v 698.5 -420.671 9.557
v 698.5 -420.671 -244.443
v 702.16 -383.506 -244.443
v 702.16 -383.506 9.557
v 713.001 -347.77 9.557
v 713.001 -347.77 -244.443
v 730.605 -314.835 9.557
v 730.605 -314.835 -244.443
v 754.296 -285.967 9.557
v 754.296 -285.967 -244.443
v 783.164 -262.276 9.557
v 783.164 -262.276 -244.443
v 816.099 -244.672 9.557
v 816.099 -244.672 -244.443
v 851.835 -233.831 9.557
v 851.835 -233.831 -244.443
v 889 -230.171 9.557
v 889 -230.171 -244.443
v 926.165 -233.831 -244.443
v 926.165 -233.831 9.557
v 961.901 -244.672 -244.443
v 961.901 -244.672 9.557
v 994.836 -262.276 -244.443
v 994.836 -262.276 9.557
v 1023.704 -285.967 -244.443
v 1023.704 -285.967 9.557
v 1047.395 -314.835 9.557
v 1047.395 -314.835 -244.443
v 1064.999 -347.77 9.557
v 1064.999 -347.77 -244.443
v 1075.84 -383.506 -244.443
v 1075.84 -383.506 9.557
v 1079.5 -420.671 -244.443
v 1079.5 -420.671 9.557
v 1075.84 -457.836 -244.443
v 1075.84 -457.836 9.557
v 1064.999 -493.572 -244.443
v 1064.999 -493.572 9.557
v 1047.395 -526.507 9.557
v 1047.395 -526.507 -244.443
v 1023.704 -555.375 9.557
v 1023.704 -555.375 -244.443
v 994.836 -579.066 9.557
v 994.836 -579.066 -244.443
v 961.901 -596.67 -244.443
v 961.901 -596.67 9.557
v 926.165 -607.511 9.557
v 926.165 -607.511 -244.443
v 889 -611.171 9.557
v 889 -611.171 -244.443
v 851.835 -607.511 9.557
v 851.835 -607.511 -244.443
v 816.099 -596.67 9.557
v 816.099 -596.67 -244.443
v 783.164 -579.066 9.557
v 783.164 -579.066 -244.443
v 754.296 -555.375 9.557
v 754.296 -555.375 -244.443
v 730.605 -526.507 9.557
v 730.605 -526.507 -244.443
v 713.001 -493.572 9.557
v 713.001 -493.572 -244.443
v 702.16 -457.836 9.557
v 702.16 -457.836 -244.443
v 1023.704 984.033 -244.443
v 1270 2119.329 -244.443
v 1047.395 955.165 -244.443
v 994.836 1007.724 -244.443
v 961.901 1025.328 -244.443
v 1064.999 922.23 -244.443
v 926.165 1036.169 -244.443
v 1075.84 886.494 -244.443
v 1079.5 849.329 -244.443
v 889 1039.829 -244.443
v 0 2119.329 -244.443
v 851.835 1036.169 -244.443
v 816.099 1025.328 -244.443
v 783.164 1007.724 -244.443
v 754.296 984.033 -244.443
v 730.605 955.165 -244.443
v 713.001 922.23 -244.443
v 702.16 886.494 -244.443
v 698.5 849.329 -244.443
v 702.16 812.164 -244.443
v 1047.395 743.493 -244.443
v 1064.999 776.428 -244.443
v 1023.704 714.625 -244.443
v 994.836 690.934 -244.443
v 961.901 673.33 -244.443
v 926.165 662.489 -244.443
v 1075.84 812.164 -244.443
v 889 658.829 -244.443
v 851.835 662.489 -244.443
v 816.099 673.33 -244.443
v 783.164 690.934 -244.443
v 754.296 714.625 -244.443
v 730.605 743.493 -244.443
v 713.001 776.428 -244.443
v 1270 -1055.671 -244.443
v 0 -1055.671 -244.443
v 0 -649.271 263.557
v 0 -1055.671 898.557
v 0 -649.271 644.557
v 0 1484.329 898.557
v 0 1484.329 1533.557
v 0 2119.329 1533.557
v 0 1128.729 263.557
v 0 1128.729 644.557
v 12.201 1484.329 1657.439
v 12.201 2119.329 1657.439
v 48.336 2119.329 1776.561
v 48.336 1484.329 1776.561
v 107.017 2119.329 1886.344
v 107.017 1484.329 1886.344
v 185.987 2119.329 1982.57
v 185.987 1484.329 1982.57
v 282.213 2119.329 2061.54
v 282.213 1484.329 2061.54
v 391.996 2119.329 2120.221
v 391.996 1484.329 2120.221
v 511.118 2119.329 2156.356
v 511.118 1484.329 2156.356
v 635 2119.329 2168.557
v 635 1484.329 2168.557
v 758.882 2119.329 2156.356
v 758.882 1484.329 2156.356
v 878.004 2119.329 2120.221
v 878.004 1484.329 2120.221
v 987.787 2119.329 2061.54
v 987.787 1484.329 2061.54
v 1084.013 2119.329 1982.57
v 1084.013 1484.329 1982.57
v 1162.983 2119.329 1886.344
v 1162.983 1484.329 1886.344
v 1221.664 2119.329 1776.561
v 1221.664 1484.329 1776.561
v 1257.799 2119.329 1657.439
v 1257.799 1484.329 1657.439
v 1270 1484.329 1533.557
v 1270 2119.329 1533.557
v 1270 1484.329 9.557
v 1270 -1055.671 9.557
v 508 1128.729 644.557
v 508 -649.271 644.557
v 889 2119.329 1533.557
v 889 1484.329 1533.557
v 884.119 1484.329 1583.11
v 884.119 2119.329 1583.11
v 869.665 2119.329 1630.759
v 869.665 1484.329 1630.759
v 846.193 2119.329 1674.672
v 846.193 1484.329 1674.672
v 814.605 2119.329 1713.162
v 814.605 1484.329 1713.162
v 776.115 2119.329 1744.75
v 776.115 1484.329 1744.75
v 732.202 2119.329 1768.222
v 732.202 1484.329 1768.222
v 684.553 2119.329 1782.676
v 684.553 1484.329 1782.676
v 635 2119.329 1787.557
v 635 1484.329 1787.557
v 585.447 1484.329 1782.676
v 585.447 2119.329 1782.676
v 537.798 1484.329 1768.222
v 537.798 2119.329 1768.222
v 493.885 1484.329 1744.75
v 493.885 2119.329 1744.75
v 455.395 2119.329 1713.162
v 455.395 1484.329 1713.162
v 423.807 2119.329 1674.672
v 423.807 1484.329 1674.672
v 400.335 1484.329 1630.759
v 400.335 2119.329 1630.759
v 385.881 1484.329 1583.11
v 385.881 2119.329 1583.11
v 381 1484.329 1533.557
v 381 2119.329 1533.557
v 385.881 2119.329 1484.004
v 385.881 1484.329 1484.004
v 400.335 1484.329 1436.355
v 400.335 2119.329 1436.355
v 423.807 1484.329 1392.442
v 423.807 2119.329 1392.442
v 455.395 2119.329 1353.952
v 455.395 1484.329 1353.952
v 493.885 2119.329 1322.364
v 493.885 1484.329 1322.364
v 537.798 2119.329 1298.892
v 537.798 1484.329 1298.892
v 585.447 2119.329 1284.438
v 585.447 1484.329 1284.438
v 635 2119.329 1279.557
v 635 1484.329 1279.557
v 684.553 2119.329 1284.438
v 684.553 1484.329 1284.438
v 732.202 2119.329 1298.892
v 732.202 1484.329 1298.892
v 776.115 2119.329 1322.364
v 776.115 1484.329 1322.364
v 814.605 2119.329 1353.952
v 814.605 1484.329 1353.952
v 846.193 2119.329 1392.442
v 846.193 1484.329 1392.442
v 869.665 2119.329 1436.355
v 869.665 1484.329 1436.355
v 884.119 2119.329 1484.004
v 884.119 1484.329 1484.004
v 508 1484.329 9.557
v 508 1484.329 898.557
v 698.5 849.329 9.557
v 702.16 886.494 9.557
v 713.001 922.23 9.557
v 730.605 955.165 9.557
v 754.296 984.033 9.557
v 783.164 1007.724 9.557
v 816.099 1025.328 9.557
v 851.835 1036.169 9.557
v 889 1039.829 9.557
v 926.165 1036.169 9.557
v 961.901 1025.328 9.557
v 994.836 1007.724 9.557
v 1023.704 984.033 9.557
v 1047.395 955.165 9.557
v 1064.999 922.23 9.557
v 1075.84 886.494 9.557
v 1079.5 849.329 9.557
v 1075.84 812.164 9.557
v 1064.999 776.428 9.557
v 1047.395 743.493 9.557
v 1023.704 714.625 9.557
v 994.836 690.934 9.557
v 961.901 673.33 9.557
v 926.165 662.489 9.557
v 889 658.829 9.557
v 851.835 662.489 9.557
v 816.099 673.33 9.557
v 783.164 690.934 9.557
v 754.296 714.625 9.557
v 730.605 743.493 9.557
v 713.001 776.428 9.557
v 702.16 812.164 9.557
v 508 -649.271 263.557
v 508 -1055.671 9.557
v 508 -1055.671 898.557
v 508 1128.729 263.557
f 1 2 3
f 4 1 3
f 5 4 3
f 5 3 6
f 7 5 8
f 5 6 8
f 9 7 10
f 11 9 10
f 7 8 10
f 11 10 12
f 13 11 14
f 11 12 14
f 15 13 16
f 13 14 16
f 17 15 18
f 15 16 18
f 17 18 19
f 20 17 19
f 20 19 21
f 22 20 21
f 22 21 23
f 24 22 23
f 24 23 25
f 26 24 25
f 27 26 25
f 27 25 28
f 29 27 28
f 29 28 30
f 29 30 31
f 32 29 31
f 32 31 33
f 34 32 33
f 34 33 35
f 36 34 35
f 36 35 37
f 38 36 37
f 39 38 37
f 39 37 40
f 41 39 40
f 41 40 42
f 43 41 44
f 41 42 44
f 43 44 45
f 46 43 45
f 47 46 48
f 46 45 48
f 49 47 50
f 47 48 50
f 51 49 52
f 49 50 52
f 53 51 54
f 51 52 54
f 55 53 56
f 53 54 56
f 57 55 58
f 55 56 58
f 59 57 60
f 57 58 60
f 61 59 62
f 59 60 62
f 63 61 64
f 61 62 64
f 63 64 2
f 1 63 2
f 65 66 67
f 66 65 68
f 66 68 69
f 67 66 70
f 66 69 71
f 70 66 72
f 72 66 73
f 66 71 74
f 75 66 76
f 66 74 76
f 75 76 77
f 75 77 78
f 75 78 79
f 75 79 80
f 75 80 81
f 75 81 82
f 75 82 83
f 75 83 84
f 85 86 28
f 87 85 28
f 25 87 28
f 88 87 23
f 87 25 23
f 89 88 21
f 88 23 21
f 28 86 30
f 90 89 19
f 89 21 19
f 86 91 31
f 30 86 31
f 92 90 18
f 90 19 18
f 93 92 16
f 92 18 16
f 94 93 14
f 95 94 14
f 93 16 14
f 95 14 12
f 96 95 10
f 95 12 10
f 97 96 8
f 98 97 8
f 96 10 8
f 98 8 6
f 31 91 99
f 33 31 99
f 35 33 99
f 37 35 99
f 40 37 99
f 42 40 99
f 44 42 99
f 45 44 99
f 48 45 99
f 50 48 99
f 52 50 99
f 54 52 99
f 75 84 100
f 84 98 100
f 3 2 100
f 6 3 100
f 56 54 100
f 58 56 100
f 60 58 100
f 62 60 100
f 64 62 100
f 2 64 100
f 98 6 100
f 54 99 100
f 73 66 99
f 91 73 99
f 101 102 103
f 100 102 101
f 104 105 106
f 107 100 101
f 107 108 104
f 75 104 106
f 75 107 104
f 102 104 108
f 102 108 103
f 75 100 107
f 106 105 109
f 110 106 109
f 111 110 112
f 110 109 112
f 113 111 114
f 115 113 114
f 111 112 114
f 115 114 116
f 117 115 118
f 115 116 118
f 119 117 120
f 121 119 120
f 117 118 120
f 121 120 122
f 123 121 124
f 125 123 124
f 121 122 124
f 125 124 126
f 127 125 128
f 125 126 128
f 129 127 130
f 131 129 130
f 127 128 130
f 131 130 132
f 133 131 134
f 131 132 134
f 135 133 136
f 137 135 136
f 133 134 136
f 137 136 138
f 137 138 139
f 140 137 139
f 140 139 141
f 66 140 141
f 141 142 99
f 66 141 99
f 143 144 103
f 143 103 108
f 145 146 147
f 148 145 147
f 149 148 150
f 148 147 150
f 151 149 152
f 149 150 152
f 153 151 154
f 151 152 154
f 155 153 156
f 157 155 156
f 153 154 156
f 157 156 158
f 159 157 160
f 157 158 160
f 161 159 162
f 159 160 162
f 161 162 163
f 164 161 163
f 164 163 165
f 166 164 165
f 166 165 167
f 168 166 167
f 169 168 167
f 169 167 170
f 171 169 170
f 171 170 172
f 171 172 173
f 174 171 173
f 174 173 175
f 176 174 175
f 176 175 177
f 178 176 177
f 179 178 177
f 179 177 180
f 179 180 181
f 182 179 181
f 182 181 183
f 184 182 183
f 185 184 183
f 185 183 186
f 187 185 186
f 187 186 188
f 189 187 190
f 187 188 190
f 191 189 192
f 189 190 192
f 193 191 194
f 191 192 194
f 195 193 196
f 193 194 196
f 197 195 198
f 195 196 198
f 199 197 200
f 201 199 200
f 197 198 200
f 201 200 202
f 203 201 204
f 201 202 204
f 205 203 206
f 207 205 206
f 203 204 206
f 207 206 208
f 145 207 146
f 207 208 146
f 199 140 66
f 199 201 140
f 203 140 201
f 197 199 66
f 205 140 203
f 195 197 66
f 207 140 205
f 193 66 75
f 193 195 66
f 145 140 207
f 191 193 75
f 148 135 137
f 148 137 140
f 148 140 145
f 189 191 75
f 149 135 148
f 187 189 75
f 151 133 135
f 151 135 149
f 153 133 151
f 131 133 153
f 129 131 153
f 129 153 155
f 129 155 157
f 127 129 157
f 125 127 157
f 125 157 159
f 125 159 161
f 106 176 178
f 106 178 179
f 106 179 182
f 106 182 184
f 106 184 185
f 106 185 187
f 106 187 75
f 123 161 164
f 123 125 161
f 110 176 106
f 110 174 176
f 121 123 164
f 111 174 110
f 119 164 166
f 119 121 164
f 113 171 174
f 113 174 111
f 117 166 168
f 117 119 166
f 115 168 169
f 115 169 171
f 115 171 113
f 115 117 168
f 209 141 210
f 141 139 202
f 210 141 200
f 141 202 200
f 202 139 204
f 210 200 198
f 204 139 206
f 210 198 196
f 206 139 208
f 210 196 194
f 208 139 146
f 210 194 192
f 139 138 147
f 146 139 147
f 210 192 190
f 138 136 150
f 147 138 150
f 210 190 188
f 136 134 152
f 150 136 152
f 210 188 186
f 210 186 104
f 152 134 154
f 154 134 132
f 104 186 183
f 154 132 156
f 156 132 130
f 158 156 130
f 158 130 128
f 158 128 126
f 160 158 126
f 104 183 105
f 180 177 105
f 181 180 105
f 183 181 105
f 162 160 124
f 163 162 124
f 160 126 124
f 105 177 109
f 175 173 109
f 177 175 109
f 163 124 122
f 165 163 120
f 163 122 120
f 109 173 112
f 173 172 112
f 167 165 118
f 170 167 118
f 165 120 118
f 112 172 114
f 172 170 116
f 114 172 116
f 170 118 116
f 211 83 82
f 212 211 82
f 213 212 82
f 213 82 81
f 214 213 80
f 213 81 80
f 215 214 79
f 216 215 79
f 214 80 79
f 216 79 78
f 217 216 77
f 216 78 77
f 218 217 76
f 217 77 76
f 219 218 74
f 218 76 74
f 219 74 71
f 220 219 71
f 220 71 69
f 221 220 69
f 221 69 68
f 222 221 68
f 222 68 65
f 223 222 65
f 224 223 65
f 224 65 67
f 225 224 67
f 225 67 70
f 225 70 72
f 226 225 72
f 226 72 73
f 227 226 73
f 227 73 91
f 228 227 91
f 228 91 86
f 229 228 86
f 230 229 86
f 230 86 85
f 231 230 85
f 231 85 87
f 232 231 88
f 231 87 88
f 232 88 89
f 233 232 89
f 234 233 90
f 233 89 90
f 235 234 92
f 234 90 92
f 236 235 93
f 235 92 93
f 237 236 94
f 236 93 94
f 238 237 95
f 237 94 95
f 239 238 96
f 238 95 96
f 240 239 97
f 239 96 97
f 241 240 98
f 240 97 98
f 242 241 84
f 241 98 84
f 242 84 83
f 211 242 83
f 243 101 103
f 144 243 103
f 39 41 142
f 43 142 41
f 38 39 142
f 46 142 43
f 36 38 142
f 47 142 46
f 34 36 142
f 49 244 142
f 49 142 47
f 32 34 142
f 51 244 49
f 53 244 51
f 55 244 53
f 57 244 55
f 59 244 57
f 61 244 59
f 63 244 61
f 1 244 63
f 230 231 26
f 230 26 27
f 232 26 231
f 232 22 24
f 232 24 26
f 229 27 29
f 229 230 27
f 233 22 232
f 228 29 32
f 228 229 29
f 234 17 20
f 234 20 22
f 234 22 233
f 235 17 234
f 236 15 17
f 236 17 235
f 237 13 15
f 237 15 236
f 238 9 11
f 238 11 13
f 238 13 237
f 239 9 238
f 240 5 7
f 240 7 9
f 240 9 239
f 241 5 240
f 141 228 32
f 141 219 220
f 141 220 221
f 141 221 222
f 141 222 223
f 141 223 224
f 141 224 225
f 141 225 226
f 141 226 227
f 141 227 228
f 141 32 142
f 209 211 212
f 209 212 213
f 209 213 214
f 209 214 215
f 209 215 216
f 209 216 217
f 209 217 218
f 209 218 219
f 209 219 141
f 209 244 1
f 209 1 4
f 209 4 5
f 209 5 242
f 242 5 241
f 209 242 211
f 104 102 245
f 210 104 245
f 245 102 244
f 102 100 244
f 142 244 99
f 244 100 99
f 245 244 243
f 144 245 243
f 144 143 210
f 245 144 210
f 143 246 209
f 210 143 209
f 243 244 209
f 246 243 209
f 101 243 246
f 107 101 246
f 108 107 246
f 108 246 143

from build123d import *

# Parameters (mm, degrees)
F0_W     = 2540
F0_H     = 254
F1_DEPTH = 1270
F3_DEPTH = 635
F5_D     = 508
F6_W     = 508
F6_H     = 2540
F7_DEPTH = 889
F8_W     = 1778
F8_H     = 381
F9_DEPTH = 1565.87305
F11_D    = 381


with BuildPart() as f1:
    # F0 (on Right) → F1 (new body)
    with BuildSketch(Plane.YZ):
        with Locations((214.329084, -117.442988)):
            Rectangle(F0_W, F0_H)
    extrude(amount=F1_DEPTH)

    # F2 (on face) → F3 (join)
    with BuildSketch(Plane(origin=(0, 1484.329084, 0), x_dir=(-1, 0, 0), z_dir=(0, 1, 0))):
        with BuildLine():
            Line((0, 9.557012), (0, 1533.557012))
            ThreePointArc((0, 1533.557012), (-635, 2168.557012), (-1270, 1533.557012))
            Line((-1270, 1533.557012), (-1270, 9.557012))
            Line((-1270, 9.557012), (-1270, -244.442988))
            Line((-1270, -244.442988), (0, -244.442988))
            Line((0, -244.442988), (0, 9.557012))
        make_face()
    extrude(amount=F3_DEPTH)

    # F5 (through all)
    with Locations(Plane(origin=(0, 2119.329084, 0), x_dir=(-1, 0, 0), z_dir=(0, 1, 0))):
        with Locations((-635, 1533.557012)):
            Hole(F5_D / 2)

    # F6 (on face) → F7 (join)
    with BuildSketch(Plane.XY.offset(9.557012)):
        with Locations((254, 214.329084)):
            Rectangle(F6_W, F6_H)
    extrude(amount=F7_DEPTH)

    # F8 (on face) → F9 (cut)
    with BuildSketch(Plane.YZ.offset(508)):
        with Locations((239.729084, 454.057012)):
            Rectangle(F8_W, F8_H)
    extrude(amount=-F9_DEPTH, mode=Mode.SUBTRACT)

    # F11 (through all)
    with Locations(Plane.XY.offset(9.557012)):
        with Locations((889, -420.670916), (889, 849.329084)):
            Hole(F11_D / 2)


solid = f1.part
